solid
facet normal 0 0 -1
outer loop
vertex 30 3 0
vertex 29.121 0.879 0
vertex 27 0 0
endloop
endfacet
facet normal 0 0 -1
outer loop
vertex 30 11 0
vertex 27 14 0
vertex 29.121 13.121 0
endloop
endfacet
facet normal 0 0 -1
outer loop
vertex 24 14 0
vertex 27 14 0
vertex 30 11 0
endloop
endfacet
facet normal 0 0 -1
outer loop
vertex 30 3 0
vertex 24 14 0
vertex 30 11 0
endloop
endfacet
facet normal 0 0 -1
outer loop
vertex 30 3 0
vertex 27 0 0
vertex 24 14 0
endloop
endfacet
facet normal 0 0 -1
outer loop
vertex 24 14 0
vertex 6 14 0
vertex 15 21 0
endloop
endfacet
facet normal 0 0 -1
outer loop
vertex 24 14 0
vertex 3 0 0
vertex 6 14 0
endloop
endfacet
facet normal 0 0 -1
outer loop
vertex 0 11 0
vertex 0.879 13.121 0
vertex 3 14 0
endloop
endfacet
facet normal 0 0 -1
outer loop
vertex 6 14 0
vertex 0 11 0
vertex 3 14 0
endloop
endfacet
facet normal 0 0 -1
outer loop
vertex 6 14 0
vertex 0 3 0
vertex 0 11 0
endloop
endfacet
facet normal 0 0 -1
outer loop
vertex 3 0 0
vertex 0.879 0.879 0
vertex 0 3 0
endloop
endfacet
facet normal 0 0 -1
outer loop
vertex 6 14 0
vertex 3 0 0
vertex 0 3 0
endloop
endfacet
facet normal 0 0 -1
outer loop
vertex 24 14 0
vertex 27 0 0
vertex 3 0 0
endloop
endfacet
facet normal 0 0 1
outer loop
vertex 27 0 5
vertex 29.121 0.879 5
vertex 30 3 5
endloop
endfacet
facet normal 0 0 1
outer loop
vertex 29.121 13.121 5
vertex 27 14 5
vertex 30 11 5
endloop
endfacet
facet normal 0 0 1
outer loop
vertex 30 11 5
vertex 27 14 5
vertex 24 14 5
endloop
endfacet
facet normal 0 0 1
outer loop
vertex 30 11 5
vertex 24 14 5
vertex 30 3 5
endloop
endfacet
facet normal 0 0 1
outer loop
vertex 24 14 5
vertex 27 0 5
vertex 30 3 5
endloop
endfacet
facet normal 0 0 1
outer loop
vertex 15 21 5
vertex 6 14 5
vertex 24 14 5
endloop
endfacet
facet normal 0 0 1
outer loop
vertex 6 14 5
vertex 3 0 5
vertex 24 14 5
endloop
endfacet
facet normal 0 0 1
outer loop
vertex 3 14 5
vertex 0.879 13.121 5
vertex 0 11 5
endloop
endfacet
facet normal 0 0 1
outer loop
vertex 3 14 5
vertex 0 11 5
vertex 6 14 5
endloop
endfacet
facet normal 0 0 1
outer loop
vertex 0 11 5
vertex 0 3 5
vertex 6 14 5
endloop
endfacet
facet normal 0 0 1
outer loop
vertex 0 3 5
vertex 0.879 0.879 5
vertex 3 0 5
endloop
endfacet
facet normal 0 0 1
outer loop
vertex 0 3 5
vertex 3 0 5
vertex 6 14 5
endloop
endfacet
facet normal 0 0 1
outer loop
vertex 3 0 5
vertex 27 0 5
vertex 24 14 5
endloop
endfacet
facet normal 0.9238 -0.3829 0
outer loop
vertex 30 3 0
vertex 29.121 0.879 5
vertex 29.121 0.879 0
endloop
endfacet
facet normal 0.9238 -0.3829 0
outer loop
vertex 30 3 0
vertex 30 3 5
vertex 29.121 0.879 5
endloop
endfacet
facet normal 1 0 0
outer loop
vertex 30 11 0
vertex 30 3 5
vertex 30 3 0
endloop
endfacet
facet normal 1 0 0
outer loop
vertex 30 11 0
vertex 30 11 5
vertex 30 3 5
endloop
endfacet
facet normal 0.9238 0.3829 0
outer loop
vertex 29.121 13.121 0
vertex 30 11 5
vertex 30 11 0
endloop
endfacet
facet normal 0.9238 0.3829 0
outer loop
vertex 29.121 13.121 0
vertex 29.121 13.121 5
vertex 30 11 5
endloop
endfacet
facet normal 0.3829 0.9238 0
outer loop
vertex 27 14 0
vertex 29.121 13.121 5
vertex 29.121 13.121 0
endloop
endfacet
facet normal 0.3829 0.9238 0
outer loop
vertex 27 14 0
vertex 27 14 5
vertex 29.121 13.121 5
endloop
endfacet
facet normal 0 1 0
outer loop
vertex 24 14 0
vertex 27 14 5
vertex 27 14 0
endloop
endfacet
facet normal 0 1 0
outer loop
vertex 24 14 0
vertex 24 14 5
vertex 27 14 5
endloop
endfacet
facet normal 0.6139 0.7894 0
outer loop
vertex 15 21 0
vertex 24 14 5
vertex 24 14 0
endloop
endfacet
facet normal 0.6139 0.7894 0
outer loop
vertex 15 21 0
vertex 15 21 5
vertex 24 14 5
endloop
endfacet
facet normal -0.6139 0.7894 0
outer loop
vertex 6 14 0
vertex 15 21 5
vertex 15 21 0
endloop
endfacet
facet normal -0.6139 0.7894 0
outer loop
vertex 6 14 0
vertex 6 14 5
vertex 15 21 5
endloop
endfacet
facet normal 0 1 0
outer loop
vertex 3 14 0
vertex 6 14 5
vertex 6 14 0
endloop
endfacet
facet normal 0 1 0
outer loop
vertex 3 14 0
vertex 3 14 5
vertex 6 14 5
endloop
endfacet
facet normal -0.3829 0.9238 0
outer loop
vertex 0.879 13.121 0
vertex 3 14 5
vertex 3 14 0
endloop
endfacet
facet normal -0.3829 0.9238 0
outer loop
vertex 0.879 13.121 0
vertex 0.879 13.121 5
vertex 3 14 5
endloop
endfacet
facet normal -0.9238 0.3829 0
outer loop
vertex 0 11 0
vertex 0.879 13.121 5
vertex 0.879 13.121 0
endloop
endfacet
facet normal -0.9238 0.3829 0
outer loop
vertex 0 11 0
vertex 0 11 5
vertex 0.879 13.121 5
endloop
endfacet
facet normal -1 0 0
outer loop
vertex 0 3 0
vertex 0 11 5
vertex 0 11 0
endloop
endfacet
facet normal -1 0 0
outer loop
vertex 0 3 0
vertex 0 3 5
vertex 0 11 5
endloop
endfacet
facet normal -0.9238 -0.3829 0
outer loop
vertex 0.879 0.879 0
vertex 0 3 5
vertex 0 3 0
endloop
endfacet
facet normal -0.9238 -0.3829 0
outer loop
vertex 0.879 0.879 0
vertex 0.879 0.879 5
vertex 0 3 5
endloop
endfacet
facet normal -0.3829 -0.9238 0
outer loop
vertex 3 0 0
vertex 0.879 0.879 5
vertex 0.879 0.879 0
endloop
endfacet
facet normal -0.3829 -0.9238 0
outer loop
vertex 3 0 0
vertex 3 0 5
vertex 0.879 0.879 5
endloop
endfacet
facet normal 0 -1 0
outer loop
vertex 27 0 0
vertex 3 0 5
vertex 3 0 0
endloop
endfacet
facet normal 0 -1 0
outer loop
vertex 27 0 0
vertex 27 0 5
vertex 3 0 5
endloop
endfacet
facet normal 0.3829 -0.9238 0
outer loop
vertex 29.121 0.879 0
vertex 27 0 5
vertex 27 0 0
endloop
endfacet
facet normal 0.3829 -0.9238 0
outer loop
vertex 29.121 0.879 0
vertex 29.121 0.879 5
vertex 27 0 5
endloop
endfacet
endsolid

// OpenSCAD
$fn = 32;

// ----------------------------------------------------------------------
// Ratchet pawl: 30 x 14 mm body, beak 7 mm сверху
// ----------------------------------------------------------------------

// --- parameters (mm) ---
profile_height = 5;       // extrusion height
profile_points = 15;      // points of the closed outline

profile = [[0, 3], [0.879, 0.879], [3, 0], [27, 0], [29.121, 0.879], [30, 3], [30, 11], [29.121, 13.121], [27, 14], [24, 14], [15, 21], [6, 14], [3, 14], [0.879, 13.121], [0, 11]];  // single closed polygon, 15 points, counter clockwise

// --- the one profile operation ---
linear_extrude(height = profile_height) polygon(points = profile);
